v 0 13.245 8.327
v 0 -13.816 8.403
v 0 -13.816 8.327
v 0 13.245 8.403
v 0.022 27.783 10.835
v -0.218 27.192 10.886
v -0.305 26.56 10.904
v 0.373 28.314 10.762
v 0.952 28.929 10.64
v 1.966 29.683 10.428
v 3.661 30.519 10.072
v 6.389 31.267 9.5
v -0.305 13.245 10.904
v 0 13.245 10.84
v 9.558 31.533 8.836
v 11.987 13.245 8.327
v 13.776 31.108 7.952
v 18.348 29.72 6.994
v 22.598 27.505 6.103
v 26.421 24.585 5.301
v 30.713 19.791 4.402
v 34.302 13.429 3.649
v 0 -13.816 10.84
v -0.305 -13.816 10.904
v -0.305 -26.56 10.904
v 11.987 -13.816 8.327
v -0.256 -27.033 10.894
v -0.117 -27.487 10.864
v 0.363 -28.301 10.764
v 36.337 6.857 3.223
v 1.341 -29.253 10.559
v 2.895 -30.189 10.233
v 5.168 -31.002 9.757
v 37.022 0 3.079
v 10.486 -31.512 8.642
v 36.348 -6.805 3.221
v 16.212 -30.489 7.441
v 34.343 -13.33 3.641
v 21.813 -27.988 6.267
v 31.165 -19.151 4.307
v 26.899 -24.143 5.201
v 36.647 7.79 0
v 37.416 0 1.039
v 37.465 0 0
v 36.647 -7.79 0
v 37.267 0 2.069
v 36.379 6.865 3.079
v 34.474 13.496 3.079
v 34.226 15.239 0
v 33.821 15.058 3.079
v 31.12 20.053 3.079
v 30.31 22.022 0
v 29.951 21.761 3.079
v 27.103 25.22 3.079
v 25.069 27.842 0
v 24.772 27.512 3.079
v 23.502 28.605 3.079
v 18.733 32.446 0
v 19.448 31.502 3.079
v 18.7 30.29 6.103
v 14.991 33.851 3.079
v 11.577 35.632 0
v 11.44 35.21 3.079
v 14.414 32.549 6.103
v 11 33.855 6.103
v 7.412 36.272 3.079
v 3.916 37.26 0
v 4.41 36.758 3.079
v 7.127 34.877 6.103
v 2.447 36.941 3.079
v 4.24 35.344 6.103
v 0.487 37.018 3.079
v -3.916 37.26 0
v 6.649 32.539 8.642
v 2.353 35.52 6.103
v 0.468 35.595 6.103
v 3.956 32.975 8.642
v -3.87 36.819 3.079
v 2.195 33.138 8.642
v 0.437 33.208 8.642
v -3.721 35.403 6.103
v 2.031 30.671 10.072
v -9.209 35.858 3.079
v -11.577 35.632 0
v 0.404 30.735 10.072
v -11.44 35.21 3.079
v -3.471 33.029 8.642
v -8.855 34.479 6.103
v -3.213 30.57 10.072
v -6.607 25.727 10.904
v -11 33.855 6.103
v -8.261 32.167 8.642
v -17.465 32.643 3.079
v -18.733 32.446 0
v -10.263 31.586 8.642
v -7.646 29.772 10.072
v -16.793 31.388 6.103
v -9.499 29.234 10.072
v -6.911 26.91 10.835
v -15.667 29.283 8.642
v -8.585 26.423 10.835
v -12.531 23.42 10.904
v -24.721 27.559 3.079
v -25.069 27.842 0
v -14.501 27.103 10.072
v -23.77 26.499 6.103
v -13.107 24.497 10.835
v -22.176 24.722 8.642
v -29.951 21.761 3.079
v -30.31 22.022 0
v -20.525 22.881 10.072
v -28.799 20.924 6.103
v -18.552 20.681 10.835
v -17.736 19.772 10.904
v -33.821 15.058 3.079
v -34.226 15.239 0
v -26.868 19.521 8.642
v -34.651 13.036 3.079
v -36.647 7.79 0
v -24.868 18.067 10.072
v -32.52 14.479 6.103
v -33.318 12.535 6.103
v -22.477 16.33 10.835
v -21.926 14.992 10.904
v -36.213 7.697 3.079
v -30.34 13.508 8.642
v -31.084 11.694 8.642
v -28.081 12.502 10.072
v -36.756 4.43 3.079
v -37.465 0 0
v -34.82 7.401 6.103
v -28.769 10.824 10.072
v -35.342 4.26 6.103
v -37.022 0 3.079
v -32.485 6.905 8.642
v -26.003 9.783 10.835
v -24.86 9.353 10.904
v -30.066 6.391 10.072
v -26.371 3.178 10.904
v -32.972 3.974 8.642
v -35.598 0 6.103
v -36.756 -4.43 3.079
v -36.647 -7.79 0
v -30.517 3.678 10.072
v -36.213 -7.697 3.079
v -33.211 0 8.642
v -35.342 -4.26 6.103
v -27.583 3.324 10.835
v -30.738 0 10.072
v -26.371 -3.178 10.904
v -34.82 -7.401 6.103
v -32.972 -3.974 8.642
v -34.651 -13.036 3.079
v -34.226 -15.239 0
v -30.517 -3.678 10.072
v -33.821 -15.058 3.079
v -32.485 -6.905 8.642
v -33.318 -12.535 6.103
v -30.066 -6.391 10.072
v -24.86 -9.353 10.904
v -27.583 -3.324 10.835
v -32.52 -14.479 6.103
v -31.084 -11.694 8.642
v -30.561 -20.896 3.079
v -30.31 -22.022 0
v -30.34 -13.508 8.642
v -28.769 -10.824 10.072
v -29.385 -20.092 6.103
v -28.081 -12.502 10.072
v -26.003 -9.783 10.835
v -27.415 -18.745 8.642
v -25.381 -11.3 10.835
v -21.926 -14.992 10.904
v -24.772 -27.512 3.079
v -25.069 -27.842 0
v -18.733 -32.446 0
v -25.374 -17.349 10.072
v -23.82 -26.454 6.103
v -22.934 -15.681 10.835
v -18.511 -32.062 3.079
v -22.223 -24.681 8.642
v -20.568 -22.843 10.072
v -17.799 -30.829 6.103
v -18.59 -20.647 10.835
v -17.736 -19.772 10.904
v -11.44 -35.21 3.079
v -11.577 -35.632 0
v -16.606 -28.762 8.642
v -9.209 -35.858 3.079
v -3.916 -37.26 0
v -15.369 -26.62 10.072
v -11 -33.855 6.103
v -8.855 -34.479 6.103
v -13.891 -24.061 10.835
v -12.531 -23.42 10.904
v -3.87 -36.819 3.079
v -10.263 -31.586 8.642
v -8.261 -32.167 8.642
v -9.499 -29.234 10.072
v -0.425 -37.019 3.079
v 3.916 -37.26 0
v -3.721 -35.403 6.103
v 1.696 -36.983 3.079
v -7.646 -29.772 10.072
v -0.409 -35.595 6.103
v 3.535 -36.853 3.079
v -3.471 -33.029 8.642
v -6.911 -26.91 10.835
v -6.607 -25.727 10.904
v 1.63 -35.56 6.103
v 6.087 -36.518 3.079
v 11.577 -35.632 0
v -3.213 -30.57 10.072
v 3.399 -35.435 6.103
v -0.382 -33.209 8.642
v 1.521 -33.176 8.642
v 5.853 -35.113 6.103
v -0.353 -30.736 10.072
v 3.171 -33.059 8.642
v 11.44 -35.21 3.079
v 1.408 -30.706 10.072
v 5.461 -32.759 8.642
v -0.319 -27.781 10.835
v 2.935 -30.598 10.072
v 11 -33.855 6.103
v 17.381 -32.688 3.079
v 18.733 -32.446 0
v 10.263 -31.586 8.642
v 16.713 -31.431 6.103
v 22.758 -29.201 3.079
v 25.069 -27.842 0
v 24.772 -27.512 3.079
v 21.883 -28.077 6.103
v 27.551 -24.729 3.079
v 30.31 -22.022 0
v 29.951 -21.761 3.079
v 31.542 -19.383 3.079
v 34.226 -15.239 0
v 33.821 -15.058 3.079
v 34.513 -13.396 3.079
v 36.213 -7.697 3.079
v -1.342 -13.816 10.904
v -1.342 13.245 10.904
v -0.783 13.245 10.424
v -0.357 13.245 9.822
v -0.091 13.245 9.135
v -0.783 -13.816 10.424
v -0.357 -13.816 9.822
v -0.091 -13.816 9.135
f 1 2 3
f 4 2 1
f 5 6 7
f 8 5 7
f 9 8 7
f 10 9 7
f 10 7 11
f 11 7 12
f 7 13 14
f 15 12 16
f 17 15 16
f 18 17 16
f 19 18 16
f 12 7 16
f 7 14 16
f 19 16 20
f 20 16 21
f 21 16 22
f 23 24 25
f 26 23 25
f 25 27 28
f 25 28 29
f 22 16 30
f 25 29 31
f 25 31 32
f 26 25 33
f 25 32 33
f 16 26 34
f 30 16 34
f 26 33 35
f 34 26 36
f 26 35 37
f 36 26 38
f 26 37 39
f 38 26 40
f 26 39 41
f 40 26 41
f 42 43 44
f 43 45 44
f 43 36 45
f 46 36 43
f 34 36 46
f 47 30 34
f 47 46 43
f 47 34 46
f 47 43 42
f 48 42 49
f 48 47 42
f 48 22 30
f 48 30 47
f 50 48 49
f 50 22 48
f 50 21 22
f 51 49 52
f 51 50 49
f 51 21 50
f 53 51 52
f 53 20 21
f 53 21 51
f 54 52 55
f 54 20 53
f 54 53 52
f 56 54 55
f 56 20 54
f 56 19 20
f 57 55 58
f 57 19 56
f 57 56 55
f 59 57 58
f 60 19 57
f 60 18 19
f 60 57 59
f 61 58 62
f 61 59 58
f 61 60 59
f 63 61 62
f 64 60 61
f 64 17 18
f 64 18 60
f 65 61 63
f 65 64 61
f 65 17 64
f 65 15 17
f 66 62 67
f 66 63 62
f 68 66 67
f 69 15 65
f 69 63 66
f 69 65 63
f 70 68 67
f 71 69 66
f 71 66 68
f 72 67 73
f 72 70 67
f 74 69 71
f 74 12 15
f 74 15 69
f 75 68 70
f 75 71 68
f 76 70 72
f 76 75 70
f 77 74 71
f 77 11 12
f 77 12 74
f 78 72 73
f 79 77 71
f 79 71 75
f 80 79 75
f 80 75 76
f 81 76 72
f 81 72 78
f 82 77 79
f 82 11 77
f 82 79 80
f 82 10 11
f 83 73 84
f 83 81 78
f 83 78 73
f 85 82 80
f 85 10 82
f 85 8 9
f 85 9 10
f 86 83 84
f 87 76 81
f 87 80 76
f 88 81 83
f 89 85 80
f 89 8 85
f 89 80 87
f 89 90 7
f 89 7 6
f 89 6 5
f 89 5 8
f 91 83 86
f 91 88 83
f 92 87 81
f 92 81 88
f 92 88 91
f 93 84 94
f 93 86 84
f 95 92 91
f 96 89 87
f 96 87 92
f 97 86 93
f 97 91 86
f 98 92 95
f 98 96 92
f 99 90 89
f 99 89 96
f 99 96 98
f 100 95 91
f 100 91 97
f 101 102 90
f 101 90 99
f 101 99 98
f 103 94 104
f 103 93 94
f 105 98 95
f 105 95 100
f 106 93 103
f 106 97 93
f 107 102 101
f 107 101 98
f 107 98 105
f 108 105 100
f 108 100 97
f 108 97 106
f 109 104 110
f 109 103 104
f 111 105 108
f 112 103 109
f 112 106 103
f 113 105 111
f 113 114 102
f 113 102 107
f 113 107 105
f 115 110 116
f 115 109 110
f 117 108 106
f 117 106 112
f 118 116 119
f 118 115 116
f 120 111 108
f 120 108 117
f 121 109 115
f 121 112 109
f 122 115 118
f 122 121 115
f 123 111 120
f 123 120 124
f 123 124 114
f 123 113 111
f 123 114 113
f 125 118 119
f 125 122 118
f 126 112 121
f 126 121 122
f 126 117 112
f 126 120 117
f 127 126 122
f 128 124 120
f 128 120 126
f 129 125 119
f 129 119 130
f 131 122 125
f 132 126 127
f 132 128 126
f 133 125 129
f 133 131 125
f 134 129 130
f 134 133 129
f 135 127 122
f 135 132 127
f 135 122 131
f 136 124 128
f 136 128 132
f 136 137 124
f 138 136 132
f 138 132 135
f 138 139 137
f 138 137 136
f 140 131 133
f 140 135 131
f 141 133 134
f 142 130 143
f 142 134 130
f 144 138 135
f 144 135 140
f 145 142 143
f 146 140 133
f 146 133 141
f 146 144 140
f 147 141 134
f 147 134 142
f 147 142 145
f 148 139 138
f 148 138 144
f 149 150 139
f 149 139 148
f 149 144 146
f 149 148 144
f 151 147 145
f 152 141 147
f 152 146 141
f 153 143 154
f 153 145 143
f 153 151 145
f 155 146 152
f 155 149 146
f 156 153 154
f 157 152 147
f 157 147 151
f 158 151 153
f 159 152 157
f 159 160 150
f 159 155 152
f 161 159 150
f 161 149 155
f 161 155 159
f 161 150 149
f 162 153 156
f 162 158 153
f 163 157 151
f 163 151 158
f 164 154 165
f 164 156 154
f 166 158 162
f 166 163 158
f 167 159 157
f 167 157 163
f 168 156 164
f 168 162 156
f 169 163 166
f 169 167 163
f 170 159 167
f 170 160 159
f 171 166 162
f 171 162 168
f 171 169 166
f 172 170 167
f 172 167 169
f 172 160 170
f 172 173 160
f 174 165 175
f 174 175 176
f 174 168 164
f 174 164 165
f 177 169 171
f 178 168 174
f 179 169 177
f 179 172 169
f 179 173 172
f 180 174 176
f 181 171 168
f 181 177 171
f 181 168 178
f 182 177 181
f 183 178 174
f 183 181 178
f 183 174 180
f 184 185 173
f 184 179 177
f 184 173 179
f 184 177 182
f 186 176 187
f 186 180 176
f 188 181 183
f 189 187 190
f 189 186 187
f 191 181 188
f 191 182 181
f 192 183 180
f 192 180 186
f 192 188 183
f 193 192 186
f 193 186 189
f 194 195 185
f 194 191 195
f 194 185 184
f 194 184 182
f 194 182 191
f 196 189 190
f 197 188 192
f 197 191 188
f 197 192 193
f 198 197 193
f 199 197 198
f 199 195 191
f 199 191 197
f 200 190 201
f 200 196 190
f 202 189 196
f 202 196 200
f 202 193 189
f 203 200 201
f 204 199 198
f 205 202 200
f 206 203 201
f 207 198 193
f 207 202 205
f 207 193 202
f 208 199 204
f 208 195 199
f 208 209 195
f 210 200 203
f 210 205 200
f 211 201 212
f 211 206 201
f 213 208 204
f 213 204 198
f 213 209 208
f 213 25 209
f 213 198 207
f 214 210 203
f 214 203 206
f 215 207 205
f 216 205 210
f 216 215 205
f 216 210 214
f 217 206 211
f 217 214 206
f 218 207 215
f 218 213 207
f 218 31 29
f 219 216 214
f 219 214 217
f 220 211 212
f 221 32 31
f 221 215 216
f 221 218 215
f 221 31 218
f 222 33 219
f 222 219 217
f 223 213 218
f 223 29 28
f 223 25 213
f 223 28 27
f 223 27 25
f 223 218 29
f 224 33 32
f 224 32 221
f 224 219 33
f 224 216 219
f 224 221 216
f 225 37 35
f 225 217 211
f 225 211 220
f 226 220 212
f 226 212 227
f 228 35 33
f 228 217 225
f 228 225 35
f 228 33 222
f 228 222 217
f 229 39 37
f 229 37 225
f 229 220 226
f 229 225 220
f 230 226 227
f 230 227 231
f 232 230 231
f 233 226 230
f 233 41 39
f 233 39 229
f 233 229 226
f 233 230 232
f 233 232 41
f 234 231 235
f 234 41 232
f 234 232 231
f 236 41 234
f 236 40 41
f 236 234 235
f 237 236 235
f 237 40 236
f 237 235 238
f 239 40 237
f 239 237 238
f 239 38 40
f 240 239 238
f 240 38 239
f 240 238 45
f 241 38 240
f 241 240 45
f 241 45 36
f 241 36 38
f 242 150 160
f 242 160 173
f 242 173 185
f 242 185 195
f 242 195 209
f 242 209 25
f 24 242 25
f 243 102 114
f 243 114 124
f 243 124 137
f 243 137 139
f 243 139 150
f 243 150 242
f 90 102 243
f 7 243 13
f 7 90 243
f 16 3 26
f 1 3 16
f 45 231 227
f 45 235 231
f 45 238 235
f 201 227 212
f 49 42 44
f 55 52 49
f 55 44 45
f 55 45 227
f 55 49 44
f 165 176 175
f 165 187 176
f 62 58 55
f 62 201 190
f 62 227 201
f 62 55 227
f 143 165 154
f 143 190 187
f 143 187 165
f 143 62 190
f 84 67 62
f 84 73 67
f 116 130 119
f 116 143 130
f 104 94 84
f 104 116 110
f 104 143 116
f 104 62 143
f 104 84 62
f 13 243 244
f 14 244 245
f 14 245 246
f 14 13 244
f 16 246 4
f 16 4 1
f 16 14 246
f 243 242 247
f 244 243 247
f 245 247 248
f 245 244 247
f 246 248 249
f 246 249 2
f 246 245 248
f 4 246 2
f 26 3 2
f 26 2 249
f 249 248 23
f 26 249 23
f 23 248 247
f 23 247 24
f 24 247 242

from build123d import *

# Parameters (mm, degrees)
F3_DEPTH      = 37.4664531479
F3_DEPTH_BACK = 37.4664531479
F4_W          = 27.0610069856
F4_H          = 5.9583876282
F5_DEPTH      = 37.4664532479
F6_T1_DEPTH   = 27.0610069856


# Not quite as in the source:
# - a fillet or chamfer that OpenCascade refuses, or shapes differently, is made with other operations: its cross-section is extruded or revolved along the edge and cut away or added


with BuildPart() as f1:
    # F0 (on Front) → F1 (revolve)
    with BuildSketch(Plane.XZ):
        with BuildLine():
            Line((0, 10.9038136992), (0, 0))
            Line((0, 0), (37.4654531479, 0))
            ThreePointArc((37.4654531479, 0), (34.2718000562, 7.7101606075), (26.5616394487, 10.9038136992))
            Line((26.5616394487, 10.9038136992), (0, 10.9038136992))
        make_face()
    revolve(axis=Axis((0, 0, 5.4519068496), (0, 0, 1)))

    # F2 (on Front) → F3 (cut, two sides)
    with BuildSketch(Plane.XZ) as f3_sk:
        Polygon((-10.2507751435, 15.1971811429), (-9.8996739835, 12.9150208086), (41.1855690181, 2.2064307705), (41.1855690181, 15.1971811429), align=None)
    extrude(amount=-F3_DEPTH, mode=Mode.SUBTRACT)
    extrude(f3_sk.sketch, amount=F3_DEPTH_BACK, mode=Mode.SUBTRACT)

    # F4 (on Right) → F5 (cut, through all)
    with BuildSketch(Plane.YZ):
        with Locations((-0.2851500176, 11.3063631579)):
            Rectangle(F4_W, F4_H)
    extrude(amount=F5_DEPTH, mode=Mode.SUBTRACT)

    # F6: fillet of radius 3 on 1 edges, made by hand

    # F6_s2 → F6_t1 (cut)
    with BuildSketch(Plane.XZ.offset(-13.2453534752)):
        with BuildLine():
            ThreePointArc((-2.3845113791, 11.3396775065), (-0.6712164267, 10.2947282416), (0, 8.4034939704))
            Line((0, 8.4034939704), (0, 10.8398314981))
            Line((0, 10.8398314981), (-2.3845113791, 11.3396775065))
        make_face()
    extrude(amount=F6_T1_DEPTH, mode=Mode.SUBTRACT)


solid = f1.part
